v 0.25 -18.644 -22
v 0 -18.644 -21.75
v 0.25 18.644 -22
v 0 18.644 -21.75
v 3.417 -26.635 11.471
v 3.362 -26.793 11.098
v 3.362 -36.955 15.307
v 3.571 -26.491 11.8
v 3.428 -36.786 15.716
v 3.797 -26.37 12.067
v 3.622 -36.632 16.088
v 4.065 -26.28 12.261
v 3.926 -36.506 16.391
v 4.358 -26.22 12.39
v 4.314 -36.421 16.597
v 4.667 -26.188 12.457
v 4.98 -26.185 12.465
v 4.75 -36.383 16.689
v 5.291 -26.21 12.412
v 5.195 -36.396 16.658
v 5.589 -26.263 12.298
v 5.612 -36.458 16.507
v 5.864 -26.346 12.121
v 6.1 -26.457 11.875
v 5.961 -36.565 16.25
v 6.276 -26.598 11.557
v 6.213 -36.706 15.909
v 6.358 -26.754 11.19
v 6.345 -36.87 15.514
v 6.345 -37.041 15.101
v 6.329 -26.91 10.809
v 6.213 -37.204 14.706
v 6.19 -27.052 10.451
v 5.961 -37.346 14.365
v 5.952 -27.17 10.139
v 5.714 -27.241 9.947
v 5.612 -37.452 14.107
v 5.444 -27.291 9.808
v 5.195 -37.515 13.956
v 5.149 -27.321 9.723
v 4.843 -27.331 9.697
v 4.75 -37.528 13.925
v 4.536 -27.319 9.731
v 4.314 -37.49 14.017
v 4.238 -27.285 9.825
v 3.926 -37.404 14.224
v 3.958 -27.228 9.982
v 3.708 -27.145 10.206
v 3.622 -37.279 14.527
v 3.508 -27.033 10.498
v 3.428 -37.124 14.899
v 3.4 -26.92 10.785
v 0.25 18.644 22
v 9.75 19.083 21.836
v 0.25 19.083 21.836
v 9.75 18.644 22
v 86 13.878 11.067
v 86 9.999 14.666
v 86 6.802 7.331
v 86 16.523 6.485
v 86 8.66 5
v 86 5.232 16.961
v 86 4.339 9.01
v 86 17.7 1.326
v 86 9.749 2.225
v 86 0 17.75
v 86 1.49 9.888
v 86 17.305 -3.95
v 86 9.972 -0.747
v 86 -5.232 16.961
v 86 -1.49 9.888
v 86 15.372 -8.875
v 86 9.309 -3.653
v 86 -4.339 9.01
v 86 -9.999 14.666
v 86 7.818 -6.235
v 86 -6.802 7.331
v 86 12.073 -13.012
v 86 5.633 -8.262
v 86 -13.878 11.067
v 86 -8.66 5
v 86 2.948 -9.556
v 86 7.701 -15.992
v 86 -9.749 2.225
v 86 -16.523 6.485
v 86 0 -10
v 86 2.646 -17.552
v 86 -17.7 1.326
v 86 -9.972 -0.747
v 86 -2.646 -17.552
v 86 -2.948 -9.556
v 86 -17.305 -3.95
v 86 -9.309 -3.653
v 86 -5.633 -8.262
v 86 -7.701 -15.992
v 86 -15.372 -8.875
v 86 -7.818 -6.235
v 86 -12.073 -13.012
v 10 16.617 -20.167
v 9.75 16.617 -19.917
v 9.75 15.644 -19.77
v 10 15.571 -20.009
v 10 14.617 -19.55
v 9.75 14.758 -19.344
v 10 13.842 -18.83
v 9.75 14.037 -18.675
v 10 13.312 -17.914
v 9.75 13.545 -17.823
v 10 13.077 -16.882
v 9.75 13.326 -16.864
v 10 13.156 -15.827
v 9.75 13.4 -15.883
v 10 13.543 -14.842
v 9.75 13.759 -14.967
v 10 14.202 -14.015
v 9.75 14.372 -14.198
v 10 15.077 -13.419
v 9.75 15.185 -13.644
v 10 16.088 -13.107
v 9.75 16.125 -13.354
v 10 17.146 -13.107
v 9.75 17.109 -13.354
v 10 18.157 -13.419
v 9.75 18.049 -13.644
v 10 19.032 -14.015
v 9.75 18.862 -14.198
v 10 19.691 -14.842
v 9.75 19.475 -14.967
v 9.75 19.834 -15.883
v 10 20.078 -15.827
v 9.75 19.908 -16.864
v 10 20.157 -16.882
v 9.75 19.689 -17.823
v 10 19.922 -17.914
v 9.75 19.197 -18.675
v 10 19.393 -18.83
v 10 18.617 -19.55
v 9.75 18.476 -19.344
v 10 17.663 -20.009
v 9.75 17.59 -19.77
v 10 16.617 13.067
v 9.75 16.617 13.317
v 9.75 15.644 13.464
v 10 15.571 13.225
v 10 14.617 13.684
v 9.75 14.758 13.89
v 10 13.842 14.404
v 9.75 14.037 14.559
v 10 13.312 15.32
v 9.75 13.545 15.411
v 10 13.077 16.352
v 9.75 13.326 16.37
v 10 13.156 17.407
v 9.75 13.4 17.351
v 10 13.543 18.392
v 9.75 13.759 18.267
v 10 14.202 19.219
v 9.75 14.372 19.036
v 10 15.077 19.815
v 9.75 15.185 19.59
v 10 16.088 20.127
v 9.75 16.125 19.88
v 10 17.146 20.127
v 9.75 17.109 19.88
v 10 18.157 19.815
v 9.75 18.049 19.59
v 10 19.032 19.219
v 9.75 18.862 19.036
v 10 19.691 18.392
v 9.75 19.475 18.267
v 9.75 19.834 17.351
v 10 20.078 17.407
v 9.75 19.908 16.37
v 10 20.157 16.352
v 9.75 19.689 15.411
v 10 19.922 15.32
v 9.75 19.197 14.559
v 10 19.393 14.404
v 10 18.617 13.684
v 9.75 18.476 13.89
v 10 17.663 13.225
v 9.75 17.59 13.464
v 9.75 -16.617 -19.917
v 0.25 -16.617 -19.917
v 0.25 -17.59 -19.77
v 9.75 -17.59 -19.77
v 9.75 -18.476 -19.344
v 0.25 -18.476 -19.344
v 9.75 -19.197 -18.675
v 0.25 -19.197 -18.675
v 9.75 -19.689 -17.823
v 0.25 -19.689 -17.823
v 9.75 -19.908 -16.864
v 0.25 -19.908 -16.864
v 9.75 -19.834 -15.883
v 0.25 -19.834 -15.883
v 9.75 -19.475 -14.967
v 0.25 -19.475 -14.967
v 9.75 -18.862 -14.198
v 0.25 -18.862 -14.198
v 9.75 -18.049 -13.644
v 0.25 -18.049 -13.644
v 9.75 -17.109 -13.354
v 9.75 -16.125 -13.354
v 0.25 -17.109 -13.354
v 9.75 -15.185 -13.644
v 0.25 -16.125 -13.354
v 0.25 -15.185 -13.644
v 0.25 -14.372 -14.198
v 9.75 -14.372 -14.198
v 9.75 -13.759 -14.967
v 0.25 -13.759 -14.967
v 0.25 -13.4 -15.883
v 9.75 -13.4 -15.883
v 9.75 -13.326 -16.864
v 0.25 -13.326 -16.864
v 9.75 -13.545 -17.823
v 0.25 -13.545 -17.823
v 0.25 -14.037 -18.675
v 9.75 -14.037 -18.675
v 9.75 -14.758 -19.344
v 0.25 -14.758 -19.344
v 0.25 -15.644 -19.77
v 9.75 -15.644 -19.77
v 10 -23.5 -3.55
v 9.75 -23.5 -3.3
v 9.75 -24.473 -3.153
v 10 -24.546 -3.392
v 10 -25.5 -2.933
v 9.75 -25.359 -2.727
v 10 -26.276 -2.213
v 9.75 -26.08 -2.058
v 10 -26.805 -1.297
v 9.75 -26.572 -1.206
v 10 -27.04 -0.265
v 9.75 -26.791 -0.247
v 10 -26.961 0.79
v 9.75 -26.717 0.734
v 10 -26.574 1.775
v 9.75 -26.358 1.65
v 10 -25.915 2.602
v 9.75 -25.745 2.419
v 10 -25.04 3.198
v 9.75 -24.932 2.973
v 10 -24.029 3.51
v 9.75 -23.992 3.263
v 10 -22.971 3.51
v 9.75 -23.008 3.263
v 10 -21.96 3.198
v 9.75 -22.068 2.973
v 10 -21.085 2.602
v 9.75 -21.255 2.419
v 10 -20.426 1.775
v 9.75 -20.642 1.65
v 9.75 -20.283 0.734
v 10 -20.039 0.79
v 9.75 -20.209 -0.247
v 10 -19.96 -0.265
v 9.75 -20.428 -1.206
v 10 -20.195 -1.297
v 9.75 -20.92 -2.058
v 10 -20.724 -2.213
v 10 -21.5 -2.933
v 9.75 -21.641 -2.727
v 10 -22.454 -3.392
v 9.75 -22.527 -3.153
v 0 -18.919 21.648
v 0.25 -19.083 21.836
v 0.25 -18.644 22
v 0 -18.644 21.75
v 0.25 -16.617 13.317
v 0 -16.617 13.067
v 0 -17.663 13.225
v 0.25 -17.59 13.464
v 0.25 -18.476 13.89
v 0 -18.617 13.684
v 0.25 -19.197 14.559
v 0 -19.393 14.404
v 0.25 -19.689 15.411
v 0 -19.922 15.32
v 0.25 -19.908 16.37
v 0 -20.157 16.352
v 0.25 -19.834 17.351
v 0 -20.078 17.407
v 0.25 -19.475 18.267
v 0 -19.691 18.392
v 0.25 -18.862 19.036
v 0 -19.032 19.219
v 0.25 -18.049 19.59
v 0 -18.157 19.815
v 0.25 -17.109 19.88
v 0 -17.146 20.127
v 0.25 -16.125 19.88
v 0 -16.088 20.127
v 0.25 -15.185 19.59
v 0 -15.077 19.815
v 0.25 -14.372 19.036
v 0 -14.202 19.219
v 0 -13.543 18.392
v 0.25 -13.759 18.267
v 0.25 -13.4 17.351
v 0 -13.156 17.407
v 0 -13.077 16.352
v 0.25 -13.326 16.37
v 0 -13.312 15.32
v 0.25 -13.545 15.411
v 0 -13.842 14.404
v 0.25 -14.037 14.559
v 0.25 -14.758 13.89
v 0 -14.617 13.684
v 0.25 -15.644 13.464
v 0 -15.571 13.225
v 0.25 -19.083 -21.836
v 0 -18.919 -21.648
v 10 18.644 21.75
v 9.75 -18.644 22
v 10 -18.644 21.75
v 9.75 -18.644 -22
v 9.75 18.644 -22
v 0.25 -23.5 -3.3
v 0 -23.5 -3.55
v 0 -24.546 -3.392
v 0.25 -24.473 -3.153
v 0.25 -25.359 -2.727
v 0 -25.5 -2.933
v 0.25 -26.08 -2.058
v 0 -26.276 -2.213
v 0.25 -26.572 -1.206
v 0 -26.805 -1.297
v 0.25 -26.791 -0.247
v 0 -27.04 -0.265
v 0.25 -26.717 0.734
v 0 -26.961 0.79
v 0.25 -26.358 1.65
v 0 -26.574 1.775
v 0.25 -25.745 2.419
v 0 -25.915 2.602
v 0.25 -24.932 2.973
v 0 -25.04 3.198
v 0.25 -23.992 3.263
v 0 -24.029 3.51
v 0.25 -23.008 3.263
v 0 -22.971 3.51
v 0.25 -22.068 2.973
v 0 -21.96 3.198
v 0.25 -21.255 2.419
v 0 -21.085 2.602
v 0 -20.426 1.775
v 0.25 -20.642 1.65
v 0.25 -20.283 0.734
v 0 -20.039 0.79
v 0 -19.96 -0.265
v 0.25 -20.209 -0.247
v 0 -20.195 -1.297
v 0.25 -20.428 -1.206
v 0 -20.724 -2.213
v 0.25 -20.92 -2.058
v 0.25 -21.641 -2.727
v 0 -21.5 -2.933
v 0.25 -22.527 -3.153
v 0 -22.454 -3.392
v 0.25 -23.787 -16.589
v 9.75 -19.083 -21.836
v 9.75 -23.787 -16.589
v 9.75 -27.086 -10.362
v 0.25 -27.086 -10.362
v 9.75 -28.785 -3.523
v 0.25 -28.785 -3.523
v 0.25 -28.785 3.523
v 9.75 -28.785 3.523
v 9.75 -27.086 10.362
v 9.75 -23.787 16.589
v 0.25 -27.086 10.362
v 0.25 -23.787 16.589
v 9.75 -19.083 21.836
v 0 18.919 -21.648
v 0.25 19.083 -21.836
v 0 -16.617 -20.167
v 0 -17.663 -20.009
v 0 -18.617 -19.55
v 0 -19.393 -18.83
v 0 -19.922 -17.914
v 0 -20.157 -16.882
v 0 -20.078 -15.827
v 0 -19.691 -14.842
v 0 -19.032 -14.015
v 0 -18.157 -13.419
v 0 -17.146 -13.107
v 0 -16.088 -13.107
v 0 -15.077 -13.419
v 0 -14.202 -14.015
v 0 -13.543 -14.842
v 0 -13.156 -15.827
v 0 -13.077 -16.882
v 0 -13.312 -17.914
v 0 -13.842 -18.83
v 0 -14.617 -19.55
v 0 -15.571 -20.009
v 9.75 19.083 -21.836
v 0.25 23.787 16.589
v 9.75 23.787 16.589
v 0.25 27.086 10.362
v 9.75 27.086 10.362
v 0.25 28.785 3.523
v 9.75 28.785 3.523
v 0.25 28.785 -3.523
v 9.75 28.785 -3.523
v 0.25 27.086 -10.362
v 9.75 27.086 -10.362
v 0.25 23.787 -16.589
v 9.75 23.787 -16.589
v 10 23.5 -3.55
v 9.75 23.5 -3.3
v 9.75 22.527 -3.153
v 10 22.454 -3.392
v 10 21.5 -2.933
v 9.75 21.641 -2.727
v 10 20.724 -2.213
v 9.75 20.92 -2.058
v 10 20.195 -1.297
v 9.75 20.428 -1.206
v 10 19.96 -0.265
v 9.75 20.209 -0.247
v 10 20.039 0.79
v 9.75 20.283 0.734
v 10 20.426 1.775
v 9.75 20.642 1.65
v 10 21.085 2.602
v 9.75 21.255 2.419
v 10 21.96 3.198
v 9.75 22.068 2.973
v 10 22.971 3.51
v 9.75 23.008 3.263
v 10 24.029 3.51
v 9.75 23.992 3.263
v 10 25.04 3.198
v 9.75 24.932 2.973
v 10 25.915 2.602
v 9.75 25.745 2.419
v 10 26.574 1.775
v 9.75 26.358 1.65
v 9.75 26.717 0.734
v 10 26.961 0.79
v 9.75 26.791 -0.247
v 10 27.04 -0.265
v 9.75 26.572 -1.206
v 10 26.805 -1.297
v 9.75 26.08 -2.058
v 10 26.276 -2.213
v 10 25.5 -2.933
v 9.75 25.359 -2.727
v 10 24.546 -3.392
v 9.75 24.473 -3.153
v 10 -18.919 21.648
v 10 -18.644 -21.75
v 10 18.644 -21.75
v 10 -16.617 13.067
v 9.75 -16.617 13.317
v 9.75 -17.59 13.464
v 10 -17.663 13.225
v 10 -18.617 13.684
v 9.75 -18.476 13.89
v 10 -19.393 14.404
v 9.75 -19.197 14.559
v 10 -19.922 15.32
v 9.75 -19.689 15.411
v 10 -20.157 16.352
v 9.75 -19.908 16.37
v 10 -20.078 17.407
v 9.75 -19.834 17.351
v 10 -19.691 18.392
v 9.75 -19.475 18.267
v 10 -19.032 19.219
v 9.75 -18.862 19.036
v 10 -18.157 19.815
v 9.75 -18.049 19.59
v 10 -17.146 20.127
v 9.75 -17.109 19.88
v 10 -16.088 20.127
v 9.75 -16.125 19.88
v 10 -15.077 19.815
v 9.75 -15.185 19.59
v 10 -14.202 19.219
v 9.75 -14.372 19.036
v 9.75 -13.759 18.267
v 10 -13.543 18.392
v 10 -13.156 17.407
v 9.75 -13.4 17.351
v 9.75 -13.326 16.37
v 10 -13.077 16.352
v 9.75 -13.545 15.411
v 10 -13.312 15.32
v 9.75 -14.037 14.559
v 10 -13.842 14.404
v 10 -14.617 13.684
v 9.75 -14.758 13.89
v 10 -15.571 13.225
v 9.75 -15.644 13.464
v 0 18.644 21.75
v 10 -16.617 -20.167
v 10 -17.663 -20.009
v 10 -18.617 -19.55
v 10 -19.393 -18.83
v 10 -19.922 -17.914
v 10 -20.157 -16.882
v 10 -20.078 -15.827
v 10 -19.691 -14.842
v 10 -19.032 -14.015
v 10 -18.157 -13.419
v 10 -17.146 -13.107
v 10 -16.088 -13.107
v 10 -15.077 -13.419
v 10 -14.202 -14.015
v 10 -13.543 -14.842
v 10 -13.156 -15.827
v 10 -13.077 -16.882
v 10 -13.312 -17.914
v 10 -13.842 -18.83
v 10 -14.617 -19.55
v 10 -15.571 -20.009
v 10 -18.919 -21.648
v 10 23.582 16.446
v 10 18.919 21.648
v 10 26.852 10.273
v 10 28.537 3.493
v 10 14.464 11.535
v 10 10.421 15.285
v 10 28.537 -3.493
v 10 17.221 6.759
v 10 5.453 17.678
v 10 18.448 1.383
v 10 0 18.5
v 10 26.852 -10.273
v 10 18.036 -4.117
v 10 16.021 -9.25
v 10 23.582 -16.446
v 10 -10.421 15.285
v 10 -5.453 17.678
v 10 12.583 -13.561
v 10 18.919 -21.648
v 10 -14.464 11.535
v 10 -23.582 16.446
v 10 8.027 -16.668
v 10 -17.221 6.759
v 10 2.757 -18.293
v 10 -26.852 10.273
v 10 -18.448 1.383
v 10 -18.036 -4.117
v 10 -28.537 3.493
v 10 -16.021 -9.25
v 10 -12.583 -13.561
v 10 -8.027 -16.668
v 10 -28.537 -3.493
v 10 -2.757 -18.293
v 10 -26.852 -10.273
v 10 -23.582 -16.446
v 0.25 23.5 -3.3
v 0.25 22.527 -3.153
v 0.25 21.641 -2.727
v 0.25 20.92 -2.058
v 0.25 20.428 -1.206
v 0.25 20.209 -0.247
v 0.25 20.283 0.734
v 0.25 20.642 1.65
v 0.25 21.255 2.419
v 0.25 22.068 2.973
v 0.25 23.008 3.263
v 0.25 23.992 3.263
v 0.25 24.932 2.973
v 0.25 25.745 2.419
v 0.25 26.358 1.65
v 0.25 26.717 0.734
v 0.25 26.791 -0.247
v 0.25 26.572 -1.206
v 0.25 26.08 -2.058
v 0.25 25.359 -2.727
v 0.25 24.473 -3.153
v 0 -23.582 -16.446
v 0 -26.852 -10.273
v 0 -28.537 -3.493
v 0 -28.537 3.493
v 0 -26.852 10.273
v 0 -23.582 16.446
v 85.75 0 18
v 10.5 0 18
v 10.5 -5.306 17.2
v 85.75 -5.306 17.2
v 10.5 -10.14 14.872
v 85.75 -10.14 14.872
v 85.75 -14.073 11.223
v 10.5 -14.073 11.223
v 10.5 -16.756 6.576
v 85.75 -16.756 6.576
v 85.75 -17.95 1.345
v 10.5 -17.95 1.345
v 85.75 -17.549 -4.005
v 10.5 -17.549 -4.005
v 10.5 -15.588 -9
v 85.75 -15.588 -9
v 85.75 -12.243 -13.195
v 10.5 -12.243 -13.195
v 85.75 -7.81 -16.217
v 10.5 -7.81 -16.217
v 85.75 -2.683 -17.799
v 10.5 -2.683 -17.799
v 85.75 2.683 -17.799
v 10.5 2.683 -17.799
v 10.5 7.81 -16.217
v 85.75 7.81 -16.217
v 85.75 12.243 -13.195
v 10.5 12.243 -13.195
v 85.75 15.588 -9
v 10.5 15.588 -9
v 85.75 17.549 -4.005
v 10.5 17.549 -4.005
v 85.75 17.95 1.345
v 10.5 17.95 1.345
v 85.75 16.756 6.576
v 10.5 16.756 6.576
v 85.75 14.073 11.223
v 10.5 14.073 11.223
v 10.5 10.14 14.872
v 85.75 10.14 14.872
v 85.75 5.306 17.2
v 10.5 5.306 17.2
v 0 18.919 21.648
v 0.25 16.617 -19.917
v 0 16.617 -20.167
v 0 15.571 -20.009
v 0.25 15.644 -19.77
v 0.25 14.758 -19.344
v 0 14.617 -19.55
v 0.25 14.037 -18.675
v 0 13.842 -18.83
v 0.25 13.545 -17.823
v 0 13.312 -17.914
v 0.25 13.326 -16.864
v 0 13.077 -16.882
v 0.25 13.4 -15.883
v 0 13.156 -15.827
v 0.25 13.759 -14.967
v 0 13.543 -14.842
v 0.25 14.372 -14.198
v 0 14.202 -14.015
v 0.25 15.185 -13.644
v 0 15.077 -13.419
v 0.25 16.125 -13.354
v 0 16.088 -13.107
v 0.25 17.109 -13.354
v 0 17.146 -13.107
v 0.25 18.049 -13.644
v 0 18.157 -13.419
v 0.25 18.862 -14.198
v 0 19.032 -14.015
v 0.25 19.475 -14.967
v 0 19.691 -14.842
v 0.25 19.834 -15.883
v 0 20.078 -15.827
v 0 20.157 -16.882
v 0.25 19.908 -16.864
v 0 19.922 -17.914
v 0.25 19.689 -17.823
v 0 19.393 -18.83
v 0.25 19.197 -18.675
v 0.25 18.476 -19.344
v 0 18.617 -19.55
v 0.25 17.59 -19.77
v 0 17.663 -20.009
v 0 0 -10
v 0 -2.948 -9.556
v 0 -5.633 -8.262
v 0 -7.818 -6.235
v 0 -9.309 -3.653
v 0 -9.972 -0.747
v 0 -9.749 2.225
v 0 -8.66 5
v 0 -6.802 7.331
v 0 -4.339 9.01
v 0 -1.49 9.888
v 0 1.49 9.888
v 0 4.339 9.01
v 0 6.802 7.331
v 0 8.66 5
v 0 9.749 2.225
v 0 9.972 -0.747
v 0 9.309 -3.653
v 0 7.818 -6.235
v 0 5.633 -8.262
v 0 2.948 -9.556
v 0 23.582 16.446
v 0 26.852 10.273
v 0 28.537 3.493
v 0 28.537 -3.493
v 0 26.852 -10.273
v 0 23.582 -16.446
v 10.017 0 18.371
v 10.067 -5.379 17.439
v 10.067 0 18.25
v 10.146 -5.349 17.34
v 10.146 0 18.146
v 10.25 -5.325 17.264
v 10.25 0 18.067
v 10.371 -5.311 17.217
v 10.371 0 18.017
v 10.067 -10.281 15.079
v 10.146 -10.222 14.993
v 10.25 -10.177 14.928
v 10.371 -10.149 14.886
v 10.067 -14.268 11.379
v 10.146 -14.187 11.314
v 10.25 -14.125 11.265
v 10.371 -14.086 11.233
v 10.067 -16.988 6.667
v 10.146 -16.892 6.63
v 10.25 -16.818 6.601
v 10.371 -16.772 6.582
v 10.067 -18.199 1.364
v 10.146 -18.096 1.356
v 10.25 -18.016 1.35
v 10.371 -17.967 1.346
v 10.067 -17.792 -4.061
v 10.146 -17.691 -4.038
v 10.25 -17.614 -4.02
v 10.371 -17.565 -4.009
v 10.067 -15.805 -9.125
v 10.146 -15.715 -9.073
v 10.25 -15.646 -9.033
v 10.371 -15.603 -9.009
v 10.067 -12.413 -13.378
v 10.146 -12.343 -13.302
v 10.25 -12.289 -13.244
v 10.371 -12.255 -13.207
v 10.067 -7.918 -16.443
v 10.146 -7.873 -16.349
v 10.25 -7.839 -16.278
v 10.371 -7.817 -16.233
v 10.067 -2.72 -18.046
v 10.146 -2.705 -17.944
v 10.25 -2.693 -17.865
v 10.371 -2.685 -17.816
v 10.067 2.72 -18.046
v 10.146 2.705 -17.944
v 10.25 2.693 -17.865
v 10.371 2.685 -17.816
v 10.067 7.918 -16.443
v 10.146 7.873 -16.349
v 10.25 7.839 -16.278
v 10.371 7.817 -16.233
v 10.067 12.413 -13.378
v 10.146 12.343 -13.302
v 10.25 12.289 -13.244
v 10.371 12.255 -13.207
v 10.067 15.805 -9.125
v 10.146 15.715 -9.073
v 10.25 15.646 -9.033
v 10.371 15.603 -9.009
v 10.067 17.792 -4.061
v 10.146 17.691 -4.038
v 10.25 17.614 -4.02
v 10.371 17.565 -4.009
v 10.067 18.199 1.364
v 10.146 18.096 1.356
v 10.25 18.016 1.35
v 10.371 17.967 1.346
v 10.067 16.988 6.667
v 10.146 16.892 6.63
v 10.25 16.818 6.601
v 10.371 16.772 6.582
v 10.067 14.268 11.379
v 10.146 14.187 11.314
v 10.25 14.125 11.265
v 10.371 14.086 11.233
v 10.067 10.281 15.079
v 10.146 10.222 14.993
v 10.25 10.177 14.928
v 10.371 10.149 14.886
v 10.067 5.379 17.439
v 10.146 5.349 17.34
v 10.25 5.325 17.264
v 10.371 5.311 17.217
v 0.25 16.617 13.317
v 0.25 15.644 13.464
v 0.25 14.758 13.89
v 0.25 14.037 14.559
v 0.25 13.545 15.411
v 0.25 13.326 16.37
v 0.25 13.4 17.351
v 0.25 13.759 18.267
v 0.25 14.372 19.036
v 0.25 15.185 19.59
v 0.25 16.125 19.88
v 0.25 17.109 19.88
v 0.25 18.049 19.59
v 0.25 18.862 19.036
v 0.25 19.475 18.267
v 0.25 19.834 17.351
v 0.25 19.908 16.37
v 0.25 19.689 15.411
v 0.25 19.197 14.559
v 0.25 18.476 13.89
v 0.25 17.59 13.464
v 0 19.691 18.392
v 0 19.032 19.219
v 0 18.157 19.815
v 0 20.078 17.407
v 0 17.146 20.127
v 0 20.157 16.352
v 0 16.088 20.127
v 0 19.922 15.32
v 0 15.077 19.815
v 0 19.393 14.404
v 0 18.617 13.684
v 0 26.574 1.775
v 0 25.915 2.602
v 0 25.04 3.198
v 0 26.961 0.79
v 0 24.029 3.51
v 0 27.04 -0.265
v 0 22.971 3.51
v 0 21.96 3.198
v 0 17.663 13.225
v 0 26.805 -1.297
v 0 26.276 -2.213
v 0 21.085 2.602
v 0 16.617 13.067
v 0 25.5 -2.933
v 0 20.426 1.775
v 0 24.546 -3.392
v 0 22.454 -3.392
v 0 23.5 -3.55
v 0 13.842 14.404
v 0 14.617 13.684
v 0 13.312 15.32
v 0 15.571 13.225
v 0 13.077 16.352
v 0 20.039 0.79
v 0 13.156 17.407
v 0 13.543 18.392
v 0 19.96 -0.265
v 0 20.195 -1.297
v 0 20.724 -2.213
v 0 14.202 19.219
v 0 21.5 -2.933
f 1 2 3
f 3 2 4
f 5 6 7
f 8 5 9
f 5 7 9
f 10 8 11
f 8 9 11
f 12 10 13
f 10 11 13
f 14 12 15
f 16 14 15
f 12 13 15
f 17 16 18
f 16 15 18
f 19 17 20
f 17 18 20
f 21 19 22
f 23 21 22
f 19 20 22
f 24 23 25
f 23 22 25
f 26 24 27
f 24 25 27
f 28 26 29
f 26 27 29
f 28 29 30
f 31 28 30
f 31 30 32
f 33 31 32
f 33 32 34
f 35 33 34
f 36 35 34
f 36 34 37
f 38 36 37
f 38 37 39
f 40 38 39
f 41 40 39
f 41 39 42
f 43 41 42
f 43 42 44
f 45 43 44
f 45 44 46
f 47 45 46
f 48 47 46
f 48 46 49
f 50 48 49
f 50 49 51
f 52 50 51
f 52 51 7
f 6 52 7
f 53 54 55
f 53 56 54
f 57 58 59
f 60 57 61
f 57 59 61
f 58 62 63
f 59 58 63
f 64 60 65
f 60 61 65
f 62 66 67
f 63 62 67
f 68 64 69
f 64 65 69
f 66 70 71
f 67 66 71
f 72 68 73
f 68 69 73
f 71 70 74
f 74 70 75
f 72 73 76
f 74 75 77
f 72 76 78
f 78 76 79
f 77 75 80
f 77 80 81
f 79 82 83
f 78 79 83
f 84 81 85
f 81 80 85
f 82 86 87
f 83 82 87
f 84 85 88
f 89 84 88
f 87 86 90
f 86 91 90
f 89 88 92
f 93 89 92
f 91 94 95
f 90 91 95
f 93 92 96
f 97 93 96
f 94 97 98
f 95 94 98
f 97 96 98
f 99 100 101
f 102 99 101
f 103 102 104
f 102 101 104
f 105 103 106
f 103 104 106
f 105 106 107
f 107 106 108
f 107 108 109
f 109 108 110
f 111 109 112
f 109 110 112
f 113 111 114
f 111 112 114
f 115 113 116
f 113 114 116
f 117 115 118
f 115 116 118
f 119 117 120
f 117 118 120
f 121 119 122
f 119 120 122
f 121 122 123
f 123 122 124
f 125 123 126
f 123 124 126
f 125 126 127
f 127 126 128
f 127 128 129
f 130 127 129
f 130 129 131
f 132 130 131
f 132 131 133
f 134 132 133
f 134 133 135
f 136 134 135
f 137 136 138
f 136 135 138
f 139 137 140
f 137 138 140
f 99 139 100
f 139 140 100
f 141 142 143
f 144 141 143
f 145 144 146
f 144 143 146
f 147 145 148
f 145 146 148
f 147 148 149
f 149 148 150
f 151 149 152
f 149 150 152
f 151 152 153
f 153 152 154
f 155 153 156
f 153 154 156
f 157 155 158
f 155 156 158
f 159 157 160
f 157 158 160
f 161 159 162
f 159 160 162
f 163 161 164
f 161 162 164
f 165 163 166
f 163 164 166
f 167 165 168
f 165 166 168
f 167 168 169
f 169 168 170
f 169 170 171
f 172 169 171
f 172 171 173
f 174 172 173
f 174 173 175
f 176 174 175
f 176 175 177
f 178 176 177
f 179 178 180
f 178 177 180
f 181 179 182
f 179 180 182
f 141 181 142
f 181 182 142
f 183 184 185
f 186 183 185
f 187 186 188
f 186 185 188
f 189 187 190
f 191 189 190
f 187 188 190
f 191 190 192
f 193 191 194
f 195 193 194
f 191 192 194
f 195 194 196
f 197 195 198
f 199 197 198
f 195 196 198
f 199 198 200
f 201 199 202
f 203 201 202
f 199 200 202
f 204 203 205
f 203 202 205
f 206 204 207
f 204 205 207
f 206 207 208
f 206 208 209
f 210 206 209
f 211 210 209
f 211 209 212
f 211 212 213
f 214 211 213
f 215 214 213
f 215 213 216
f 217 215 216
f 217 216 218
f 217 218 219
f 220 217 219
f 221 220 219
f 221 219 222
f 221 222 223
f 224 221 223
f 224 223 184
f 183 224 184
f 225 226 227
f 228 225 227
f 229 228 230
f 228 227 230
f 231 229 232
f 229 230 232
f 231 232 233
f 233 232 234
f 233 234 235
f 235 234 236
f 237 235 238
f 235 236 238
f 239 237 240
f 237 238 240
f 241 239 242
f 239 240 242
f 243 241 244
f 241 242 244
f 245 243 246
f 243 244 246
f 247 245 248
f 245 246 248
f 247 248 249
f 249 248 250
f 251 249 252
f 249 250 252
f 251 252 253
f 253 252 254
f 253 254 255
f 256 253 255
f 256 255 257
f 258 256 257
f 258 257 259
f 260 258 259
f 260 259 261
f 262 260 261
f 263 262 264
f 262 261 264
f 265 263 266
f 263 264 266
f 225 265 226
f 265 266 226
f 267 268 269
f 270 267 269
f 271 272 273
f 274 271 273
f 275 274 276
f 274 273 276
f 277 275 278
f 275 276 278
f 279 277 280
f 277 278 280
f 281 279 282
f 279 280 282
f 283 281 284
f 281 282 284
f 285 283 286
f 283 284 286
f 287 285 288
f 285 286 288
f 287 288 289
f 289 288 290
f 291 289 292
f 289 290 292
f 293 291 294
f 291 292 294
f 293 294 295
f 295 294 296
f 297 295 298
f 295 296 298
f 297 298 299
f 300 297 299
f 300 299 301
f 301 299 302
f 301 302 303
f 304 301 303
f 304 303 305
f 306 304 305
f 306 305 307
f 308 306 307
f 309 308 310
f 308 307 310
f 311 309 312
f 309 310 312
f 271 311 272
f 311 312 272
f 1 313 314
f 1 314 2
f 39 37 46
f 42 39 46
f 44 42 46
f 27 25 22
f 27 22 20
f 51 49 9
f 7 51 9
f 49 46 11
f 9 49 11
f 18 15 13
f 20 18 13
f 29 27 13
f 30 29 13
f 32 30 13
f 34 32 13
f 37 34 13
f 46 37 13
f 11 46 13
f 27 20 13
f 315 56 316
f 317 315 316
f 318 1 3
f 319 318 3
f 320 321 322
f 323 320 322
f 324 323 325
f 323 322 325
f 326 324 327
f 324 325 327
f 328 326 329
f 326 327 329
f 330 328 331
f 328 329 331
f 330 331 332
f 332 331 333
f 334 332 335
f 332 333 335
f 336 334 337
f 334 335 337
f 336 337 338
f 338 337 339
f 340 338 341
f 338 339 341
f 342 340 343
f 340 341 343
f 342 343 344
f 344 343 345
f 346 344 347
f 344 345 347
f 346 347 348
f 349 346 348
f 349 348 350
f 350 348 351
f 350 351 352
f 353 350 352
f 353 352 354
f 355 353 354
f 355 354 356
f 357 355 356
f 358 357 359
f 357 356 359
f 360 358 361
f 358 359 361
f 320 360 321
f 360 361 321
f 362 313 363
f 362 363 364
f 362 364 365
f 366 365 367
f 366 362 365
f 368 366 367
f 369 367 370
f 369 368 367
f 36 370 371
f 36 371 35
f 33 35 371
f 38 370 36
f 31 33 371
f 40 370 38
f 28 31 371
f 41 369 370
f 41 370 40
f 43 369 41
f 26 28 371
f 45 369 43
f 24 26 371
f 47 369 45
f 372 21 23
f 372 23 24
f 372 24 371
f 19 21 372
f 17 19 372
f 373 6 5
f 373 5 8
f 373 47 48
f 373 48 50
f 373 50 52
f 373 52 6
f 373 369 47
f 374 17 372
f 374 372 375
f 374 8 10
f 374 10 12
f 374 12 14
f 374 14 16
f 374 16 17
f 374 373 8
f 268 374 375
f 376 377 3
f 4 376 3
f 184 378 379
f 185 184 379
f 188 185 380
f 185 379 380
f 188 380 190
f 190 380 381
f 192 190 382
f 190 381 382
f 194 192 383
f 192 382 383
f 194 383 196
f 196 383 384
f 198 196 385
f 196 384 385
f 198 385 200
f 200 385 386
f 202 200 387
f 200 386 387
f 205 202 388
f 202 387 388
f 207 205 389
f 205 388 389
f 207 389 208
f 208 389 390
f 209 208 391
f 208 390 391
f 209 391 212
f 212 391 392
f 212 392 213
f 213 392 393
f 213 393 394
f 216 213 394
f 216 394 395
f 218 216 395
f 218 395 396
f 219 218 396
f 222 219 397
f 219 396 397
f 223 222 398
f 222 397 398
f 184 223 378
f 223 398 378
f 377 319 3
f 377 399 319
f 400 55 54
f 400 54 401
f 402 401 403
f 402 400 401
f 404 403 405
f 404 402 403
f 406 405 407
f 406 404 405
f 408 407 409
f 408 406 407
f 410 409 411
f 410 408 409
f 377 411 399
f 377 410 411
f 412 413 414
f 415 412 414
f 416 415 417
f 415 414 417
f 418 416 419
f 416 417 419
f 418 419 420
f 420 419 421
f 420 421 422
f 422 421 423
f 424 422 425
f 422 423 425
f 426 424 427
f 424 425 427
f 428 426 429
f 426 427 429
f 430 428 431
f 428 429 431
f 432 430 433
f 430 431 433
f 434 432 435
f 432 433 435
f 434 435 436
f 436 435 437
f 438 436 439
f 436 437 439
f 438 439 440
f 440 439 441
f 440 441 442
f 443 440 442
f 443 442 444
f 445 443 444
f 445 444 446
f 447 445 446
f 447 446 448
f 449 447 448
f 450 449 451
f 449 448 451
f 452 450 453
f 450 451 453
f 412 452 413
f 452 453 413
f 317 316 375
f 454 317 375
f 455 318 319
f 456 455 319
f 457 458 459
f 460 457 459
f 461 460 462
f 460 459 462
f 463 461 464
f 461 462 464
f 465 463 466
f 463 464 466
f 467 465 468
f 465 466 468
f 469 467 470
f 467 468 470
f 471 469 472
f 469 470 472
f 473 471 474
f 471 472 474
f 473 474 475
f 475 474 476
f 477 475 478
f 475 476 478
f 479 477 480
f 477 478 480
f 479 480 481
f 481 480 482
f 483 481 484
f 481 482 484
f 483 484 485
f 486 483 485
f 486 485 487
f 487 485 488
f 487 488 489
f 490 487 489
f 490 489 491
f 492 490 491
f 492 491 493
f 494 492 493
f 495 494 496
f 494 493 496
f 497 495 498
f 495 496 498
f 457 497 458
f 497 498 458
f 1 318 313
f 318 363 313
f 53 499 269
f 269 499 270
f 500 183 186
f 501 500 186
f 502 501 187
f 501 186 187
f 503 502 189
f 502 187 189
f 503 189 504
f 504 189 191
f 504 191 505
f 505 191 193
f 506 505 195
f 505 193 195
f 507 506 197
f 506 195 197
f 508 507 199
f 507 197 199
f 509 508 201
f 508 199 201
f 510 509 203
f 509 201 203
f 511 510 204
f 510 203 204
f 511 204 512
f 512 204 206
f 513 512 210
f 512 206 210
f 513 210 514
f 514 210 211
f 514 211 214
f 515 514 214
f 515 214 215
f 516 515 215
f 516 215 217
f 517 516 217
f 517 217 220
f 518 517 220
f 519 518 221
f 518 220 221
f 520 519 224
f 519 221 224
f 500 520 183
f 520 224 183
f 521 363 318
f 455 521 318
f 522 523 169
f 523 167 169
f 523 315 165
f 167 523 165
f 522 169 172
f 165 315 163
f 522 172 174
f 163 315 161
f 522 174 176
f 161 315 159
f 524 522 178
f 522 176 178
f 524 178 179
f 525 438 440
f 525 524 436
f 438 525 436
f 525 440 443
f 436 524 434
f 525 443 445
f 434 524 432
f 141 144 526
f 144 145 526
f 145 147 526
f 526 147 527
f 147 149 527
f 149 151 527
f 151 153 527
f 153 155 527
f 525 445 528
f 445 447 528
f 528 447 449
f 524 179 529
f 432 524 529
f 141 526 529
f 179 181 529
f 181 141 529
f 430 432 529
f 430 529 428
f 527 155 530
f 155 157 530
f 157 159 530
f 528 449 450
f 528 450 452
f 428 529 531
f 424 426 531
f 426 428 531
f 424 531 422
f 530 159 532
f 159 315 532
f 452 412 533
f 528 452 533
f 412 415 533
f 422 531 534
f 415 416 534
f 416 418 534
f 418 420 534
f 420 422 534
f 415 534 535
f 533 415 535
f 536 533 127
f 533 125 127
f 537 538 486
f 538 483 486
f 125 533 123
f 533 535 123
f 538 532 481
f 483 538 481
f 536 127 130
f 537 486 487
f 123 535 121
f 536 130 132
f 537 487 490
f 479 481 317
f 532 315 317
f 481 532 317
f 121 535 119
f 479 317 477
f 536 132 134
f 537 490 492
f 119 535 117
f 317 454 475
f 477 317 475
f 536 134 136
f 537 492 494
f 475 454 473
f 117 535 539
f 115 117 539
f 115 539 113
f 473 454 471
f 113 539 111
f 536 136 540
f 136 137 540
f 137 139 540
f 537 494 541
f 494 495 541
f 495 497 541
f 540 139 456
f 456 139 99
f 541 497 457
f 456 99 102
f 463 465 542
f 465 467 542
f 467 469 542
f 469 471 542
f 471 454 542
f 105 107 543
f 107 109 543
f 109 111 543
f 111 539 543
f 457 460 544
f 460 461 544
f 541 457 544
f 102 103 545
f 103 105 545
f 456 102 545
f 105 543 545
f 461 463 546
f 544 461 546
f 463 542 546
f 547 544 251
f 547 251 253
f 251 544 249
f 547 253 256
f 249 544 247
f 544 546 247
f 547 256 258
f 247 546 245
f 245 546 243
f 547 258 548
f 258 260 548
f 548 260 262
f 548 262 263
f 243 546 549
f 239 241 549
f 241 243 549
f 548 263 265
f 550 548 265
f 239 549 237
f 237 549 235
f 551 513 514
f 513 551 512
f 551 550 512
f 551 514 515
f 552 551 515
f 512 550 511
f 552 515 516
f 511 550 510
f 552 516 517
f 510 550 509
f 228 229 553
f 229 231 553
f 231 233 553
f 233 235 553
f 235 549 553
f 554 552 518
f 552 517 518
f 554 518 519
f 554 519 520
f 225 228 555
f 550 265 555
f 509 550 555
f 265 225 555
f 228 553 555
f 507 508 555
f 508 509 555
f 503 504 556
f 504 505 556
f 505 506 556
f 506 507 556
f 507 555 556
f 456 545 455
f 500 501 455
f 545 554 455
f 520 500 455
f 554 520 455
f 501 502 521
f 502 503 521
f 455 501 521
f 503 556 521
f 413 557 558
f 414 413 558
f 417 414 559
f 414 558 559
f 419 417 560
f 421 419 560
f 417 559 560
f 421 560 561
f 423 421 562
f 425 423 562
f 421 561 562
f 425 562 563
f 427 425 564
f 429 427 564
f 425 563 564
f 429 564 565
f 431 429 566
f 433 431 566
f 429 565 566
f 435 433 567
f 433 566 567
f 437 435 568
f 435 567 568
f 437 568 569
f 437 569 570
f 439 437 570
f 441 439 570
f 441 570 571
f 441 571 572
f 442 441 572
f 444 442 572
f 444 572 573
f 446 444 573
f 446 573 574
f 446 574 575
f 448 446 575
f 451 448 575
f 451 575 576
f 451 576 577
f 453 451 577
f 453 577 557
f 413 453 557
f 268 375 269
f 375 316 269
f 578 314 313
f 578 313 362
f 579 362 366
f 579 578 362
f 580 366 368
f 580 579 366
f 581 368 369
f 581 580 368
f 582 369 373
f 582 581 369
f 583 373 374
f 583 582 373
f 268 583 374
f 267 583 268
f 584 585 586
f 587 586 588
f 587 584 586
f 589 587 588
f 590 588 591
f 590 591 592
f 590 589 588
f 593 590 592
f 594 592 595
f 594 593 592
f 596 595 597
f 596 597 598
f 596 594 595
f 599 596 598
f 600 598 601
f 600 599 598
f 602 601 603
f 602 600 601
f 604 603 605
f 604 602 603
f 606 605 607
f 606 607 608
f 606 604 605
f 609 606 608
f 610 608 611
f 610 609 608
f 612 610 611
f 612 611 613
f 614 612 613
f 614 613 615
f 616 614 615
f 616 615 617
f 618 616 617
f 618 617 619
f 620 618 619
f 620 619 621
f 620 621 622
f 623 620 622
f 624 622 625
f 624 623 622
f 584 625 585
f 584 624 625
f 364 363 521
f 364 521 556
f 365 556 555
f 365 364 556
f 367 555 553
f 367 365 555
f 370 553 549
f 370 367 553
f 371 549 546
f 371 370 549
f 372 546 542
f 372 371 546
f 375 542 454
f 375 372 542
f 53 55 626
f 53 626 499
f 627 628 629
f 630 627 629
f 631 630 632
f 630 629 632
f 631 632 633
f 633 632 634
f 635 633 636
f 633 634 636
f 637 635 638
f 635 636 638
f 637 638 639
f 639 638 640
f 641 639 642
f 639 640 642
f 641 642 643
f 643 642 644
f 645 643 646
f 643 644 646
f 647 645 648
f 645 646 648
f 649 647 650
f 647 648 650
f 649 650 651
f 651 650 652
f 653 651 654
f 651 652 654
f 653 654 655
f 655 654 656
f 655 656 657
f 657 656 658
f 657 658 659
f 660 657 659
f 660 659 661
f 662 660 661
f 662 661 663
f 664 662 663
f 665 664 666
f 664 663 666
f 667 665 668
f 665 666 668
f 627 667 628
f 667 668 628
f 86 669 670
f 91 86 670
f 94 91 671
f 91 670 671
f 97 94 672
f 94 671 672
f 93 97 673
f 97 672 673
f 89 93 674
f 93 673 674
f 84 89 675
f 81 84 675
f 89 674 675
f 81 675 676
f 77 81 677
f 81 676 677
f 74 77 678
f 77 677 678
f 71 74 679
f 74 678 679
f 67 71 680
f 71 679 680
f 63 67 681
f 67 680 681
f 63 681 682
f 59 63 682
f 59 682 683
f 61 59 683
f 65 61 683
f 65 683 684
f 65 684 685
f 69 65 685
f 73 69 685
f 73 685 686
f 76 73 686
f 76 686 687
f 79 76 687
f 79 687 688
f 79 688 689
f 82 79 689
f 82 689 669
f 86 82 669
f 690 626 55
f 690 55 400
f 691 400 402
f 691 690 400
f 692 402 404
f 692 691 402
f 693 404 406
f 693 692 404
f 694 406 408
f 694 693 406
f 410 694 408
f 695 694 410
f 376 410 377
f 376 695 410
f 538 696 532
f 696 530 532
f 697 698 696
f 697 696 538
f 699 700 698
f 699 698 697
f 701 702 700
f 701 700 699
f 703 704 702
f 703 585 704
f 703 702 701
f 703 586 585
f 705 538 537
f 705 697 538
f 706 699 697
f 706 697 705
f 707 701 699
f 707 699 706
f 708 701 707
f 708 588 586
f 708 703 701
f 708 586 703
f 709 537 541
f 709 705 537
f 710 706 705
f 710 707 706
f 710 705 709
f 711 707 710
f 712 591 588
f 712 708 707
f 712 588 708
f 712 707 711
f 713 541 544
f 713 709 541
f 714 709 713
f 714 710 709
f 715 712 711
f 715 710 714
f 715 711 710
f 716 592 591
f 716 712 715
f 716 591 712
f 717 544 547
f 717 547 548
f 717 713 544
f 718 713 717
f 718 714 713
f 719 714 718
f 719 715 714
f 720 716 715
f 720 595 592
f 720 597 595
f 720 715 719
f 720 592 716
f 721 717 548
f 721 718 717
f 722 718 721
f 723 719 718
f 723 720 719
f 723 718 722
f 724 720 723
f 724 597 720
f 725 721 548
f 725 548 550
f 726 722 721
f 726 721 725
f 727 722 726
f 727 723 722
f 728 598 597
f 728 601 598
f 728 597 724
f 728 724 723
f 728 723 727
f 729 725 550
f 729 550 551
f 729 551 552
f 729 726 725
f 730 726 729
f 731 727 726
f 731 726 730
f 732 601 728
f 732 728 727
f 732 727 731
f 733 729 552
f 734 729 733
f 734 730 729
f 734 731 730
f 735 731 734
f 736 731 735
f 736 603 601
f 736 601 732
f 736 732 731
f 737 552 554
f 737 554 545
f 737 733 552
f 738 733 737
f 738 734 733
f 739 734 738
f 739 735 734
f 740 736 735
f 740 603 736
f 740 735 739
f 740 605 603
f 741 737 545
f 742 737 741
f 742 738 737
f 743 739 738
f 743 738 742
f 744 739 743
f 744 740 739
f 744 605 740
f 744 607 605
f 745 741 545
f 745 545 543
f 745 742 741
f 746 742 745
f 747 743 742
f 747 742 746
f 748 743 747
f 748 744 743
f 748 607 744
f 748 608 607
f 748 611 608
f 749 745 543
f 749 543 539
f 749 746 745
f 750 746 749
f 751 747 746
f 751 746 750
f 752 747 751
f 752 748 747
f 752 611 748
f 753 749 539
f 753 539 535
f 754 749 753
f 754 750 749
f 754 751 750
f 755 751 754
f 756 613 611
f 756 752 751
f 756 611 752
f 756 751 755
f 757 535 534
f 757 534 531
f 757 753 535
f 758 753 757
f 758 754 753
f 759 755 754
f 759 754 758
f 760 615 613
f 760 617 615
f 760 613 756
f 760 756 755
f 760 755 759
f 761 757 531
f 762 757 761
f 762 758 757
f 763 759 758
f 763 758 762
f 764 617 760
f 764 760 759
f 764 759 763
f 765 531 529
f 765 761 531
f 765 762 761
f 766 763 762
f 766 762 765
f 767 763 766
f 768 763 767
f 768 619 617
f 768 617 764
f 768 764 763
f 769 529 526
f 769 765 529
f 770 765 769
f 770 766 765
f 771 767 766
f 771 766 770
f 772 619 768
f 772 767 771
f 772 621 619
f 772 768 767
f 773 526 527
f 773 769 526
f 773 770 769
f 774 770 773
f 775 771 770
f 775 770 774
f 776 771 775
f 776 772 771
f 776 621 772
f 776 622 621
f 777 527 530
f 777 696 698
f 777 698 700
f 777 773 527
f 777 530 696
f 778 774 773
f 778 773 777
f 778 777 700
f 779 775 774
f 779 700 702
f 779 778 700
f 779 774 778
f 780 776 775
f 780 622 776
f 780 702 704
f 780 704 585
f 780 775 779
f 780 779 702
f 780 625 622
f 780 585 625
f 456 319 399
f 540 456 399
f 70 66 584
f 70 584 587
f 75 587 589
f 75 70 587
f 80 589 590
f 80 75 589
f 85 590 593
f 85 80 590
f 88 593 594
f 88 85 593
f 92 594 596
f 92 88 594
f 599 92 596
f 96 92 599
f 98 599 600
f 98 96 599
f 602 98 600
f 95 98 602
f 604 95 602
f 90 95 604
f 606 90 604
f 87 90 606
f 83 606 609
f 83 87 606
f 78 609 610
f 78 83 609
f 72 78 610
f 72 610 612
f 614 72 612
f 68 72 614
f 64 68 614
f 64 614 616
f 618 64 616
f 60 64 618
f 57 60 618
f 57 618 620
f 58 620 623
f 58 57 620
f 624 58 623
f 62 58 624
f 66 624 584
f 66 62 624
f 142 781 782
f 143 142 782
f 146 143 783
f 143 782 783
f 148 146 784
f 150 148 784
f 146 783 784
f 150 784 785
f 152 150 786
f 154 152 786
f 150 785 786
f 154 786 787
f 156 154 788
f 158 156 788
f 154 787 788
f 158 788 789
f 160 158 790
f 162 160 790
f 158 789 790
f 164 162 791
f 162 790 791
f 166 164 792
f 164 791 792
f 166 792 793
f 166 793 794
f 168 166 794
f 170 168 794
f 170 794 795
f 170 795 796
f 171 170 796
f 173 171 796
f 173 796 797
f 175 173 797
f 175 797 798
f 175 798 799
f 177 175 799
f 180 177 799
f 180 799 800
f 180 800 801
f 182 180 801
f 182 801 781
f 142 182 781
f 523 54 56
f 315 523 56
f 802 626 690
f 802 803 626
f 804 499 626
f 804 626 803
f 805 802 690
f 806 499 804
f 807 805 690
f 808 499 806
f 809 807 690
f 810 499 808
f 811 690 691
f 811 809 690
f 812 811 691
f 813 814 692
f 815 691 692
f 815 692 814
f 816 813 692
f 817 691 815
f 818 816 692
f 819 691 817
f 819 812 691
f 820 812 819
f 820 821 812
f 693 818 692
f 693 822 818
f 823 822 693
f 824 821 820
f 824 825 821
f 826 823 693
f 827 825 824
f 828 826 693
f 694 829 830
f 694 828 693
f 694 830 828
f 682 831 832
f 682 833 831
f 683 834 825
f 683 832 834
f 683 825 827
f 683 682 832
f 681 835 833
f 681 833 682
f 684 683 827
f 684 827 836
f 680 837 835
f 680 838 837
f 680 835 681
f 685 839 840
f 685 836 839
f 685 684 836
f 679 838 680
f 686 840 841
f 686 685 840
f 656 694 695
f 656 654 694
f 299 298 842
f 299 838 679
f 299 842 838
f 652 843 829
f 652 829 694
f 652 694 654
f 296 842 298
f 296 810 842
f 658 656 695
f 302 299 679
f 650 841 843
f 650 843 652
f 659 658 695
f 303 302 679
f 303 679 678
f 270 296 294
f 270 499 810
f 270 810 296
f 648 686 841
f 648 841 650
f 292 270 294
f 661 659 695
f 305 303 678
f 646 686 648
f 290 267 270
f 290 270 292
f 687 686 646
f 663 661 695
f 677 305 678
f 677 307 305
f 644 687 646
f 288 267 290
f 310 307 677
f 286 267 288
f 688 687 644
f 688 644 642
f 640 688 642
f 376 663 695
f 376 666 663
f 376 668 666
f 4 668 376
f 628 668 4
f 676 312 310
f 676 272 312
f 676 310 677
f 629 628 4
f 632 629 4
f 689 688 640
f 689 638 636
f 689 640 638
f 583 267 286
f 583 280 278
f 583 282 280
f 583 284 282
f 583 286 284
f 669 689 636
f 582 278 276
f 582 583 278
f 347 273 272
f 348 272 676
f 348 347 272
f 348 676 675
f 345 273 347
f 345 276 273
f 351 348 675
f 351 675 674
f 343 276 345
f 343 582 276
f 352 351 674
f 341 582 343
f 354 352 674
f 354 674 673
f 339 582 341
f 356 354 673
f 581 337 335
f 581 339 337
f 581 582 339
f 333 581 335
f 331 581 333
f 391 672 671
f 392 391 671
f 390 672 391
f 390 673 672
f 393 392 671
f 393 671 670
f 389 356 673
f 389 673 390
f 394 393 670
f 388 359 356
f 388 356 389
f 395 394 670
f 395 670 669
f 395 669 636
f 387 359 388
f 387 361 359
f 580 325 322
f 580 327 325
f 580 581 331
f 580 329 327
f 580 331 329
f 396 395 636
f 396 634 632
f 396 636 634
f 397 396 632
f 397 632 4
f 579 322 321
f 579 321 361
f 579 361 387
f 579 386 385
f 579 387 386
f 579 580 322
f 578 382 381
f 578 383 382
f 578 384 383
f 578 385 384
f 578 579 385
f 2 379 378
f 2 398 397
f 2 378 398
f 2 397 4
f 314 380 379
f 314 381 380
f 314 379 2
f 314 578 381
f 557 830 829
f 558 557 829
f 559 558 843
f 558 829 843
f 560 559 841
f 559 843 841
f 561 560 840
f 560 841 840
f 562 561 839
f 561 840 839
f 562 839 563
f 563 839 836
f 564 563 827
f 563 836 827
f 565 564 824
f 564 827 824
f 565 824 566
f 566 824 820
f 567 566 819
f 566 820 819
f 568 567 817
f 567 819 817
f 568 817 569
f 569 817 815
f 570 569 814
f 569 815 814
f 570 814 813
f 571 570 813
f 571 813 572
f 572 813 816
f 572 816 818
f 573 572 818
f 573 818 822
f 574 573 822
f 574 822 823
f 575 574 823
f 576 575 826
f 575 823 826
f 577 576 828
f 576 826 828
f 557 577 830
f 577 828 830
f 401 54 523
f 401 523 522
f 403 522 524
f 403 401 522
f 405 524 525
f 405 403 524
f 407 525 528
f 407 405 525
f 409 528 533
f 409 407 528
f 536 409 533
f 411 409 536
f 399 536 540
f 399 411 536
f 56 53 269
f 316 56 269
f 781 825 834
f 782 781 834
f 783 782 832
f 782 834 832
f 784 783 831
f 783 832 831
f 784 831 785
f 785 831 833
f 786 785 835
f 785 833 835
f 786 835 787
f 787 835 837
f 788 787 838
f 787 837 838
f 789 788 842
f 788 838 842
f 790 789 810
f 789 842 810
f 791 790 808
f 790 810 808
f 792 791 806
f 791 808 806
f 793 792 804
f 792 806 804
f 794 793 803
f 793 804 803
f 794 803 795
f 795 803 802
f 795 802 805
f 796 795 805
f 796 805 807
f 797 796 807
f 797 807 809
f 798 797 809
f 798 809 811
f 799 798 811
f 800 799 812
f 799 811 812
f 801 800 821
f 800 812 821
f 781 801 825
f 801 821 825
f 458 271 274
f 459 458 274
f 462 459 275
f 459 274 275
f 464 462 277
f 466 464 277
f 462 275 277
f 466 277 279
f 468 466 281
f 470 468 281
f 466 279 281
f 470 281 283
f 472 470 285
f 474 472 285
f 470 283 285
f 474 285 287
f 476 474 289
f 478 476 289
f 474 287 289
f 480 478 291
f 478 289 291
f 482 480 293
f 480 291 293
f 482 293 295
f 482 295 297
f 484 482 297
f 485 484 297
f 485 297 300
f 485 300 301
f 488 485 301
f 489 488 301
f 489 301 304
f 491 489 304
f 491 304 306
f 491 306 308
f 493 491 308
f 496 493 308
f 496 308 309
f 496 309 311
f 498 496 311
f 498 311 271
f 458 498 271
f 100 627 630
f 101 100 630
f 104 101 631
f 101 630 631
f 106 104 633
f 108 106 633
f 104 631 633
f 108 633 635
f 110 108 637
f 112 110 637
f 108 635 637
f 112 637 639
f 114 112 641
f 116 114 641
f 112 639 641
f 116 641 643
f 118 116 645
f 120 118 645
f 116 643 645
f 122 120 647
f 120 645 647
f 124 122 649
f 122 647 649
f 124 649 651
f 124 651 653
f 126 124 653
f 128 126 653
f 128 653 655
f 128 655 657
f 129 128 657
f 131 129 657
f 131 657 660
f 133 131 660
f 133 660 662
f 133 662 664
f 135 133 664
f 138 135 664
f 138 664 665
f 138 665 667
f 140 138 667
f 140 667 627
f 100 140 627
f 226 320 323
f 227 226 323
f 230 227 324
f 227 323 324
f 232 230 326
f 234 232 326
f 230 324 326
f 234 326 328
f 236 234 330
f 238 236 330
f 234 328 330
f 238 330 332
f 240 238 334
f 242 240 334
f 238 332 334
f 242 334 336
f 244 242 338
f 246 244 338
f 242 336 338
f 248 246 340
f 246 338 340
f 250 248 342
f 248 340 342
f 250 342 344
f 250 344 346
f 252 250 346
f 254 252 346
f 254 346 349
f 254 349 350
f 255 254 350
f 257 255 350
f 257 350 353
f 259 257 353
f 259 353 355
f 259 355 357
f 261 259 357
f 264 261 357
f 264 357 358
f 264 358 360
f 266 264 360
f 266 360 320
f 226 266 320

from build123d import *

# Parameters (mm, degrees)
SKETCH_W        = 86
SKETCH_H        = 18
SKETCH001_R     = 29
PAD_DEPTH       = 10
SKETCH002_W     = 20
SKETCH002_H     = 49.824667
POCKET_DEPTH    = 86.001
SKETCH003_R     = 3.3
POCKET001_DEPTH = 86.001
SKETCH005_R     = 1.5
PAD001_DEPTH    = 29
FILLET_R        = 0.5
CHAMFER_SIZE    = 0.25
CHAMFER001_SIZE = 0.25
CHAMFER002_SIZE = 0.25
SKETCH007_R     = 10
POCKET002_DEPTH = 86.001


with BuildPart() as part:
    # Sketch → Revolution (revolve)
    with BuildSketch(Plane.XZ):
        with Locations((43, 9)):
            Rectangle(SKETCH_W, SKETCH_H)
    revolve(axis=Axis((0, 0, 0), (1, 0, 0)))

    # Sketch001 (on Face3 of Revolution) → Pad (new body)
    with BuildSketch(Plane(origin=(0, 0, 0), x_dir=(0, 0, -1), z_dir=(-1, 0, 0))):
        Circle(SKETCH001_R)
    extrude(amount=-PAD_DEPTH)

    # Sketch002 (on Face5 of Pad) → Pocket (cut, through all)
    with BuildSketch(Plane(origin=(0, 0, 0), x_dir=(0, 0, -1), z_dir=(-1, 0, 0))):
        with Locations((-32, 24.912333)):
            Rectangle(SKETCH002_W, SKETCH002_H)
        with Locations((-32, -24.912333)):
            Rectangle(SKETCH002_W, SKETCH002_H)
        with Locations((32, 24.912333)):
            Rectangle(SKETCH002_W, SKETCH002_H)
        with Locations((32, -24.912333)):
            Rectangle(SKETCH002_W, SKETCH002_H)
    extrude(amount=-POCKET_DEPTH, mode=Mode.SUBTRACT)

    # Sketch003 (on Face6 of Pocket) → Pocket001 (cut, through all)
    with BuildSketch(Plane(origin=(0, 0, 0), x_dir=(0, 0, -1), z_dir=(-1, 0, 0))):
        with Locations((-16.617001, -16.617018)):
            Circle(SKETCH003_R)
        with Locations((0, -23.5)):
            Circle(SKETCH003_R)
        with Locations((16.617012, -16.617007)):
            Circle(SKETCH003_R)
        with Locations((-16.617001, 16.617018)):
            Circle(SKETCH003_R)
        with Locations((0, 23.5)):
            Circle(SKETCH003_R)
        with Locations((16.617012, 16.617007)):
            Circle(SKETCH003_R)
    extrude(amount=-POCKET001_DEPTH, mode=Mode.SUBTRACT)

    # Sketch005 (on DatumPlane) → Pad001 (join)
    with BuildSketch(Plane(origin=(5, -36.955188, 15.307322), x_dir=(-1, 0, 0), z_dir=(0, 0.92388, -0.382683))):
        with Locations((0.138398, 0)):
            Circle(SKETCH005_R)
    extrude(amount=PAD001_DEPTH)

    # Fillet
    fillet_edges = [part.edges().sort_by_distance(p)[0] for p in [
        (10, 0, -18),
    ]]
    fillet(fillet_edges, radius=FILLET_R)

    # Chamfer
    chamfer_edges = [part.edges().sort_by_distance(p)[0] for p in [
        (0, 0, 22),
        (5, -18.894444, 22),
        (10, 0, 22),
        (5, 18.894444, 22),
        (0, -29, 0),
        (10, -29, 0),
        (0, 0, -22),
        (5, 18.894444, -22),
        (10, 0, -22),
        (5, -18.894444, -22),
        (0, 29, 0),
        (10, 29, 0),
    ]]
    chamfer(chamfer_edges, length=CHAMFER_SIZE)

    # Chamfer001
    chamfer001_edges = [part.edges().sort_by_distance(p)[0] for p in [
        (86, 0, -18),
    ]]
    chamfer(chamfer001_edges, length=CHAMFER001_SIZE)

    # Chamfer002
    chamfer002_edges = [part.edges().sort_by_distance(p)[0] for p in [
        (0, -16.617018, 19.917001),
        (5, -16.617018, 13.317001),
        (10, -16.617018, 19.917001),
        (0, 16.617018, 19.917001),
        (5, 16.617018, 13.317001),
        (10, 16.617018, 19.917001),
        (0, 23.5, 3.3),
        (5, 23.5, -3.3),
        (10, 23.5, 3.3),
        (0, 16.617007, -13.317012),
        (5, 16.617007, -19.917012),
        (10, 16.617007, -13.317012),
        (0, -23.5, 3.3),
        (5, -23.5, -3.3),
        (10, -23.5, 3.3),
        (0, -16.617007, -13.317012),
        (5, -16.617007, -19.917012),
        (10, -16.617007, -13.317012),
    ]]
    chamfer(chamfer002_edges, length=CHAMFER002_SIZE)

    # Sketch007 (on Face48 of Chamfer002) → Pocket002 (cut, through all)
    with BuildSketch(Plane(origin=(0, 0, 0), x_dir=(0, 0, -1), z_dir=(-1, 0, 0))):
        Circle(SKETCH007_R)
    extrude(amount=-POCKET002_DEPTH, mode=Mode.SUBTRACT)


solid = part.part
